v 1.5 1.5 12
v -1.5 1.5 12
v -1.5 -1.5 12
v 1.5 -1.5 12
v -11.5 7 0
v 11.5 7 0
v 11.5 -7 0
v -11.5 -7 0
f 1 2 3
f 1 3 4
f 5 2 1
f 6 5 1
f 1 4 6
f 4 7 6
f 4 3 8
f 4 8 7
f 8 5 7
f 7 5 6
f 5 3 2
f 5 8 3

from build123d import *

# Parameters (mm, degrees)
F0_W       = 23
F0_H       = 14
F1_DEPTH   = 12
F2_SIZE2   = 11.99999
F2_SIZE    = 9.99999
F3_SIZE2   = 5.49999
F3_SIZE    = 11.99999
F3_2_SIZE2 = 5.49999
F3_2_SIZE  = 11.99999


# Not quite as in the source:
# - a fillet or chamfer is up to 0.001 mm smaller than in the source, because OpenCascade refuses the exact size


with BuildPart() as f1:
    # F0 (on Top) → F1 (new body)
    with BuildSketch(Plane.XY):
        Rectangle(F0_W, F0_H)
    extrude(amount=F1_DEPTH)

    # F2 (size 10 and 12 in the source; OpenCascade refuses exactly that, so slightly less here)
    f2_edges = [f1.edges().sort_by_distance(p)[0] for p in [
        (-11.5, 0, 12),
        (11.5, 0, 12),
    ]]
    f2_side = f1.faces().sort_by_distance((0, 0, 12))[0]
    chamfer(f2_edges, length=F2_SIZE, length2=F2_SIZE2, reference=f2_side)

    # F3 (size 12 and 5.5 in the source; OpenCascade refuses exactly that, so slightly less here)
    f3_edges = [f1.edges().sort_by_distance(p)[0] for p in [
        (0, -7, 12),
    ]]
    f3_side = f1.faces().sort_by_distance((0, -7, 4.461541))[0]
    chamfer(f3_edges, length=F3_SIZE, length2=F3_SIZE2, reference=f3_side)

    # F3#2 (size 12 and 5.5 in the source; OpenCascade refuses exactly that, so slightly less here)
    f3_2_edges = [f1.edges().sort_by_distance(p)[0] for p in [
        (0, 7, 12),
    ]]
    f3_2_side = f1.faces().sort_by_distance((0, 7, 4.461541))[0]
    chamfer(f3_2_edges, length=F3_2_SIZE, length2=F3_2_SIZE2, reference=f3_2_side)


solid = f1.part
